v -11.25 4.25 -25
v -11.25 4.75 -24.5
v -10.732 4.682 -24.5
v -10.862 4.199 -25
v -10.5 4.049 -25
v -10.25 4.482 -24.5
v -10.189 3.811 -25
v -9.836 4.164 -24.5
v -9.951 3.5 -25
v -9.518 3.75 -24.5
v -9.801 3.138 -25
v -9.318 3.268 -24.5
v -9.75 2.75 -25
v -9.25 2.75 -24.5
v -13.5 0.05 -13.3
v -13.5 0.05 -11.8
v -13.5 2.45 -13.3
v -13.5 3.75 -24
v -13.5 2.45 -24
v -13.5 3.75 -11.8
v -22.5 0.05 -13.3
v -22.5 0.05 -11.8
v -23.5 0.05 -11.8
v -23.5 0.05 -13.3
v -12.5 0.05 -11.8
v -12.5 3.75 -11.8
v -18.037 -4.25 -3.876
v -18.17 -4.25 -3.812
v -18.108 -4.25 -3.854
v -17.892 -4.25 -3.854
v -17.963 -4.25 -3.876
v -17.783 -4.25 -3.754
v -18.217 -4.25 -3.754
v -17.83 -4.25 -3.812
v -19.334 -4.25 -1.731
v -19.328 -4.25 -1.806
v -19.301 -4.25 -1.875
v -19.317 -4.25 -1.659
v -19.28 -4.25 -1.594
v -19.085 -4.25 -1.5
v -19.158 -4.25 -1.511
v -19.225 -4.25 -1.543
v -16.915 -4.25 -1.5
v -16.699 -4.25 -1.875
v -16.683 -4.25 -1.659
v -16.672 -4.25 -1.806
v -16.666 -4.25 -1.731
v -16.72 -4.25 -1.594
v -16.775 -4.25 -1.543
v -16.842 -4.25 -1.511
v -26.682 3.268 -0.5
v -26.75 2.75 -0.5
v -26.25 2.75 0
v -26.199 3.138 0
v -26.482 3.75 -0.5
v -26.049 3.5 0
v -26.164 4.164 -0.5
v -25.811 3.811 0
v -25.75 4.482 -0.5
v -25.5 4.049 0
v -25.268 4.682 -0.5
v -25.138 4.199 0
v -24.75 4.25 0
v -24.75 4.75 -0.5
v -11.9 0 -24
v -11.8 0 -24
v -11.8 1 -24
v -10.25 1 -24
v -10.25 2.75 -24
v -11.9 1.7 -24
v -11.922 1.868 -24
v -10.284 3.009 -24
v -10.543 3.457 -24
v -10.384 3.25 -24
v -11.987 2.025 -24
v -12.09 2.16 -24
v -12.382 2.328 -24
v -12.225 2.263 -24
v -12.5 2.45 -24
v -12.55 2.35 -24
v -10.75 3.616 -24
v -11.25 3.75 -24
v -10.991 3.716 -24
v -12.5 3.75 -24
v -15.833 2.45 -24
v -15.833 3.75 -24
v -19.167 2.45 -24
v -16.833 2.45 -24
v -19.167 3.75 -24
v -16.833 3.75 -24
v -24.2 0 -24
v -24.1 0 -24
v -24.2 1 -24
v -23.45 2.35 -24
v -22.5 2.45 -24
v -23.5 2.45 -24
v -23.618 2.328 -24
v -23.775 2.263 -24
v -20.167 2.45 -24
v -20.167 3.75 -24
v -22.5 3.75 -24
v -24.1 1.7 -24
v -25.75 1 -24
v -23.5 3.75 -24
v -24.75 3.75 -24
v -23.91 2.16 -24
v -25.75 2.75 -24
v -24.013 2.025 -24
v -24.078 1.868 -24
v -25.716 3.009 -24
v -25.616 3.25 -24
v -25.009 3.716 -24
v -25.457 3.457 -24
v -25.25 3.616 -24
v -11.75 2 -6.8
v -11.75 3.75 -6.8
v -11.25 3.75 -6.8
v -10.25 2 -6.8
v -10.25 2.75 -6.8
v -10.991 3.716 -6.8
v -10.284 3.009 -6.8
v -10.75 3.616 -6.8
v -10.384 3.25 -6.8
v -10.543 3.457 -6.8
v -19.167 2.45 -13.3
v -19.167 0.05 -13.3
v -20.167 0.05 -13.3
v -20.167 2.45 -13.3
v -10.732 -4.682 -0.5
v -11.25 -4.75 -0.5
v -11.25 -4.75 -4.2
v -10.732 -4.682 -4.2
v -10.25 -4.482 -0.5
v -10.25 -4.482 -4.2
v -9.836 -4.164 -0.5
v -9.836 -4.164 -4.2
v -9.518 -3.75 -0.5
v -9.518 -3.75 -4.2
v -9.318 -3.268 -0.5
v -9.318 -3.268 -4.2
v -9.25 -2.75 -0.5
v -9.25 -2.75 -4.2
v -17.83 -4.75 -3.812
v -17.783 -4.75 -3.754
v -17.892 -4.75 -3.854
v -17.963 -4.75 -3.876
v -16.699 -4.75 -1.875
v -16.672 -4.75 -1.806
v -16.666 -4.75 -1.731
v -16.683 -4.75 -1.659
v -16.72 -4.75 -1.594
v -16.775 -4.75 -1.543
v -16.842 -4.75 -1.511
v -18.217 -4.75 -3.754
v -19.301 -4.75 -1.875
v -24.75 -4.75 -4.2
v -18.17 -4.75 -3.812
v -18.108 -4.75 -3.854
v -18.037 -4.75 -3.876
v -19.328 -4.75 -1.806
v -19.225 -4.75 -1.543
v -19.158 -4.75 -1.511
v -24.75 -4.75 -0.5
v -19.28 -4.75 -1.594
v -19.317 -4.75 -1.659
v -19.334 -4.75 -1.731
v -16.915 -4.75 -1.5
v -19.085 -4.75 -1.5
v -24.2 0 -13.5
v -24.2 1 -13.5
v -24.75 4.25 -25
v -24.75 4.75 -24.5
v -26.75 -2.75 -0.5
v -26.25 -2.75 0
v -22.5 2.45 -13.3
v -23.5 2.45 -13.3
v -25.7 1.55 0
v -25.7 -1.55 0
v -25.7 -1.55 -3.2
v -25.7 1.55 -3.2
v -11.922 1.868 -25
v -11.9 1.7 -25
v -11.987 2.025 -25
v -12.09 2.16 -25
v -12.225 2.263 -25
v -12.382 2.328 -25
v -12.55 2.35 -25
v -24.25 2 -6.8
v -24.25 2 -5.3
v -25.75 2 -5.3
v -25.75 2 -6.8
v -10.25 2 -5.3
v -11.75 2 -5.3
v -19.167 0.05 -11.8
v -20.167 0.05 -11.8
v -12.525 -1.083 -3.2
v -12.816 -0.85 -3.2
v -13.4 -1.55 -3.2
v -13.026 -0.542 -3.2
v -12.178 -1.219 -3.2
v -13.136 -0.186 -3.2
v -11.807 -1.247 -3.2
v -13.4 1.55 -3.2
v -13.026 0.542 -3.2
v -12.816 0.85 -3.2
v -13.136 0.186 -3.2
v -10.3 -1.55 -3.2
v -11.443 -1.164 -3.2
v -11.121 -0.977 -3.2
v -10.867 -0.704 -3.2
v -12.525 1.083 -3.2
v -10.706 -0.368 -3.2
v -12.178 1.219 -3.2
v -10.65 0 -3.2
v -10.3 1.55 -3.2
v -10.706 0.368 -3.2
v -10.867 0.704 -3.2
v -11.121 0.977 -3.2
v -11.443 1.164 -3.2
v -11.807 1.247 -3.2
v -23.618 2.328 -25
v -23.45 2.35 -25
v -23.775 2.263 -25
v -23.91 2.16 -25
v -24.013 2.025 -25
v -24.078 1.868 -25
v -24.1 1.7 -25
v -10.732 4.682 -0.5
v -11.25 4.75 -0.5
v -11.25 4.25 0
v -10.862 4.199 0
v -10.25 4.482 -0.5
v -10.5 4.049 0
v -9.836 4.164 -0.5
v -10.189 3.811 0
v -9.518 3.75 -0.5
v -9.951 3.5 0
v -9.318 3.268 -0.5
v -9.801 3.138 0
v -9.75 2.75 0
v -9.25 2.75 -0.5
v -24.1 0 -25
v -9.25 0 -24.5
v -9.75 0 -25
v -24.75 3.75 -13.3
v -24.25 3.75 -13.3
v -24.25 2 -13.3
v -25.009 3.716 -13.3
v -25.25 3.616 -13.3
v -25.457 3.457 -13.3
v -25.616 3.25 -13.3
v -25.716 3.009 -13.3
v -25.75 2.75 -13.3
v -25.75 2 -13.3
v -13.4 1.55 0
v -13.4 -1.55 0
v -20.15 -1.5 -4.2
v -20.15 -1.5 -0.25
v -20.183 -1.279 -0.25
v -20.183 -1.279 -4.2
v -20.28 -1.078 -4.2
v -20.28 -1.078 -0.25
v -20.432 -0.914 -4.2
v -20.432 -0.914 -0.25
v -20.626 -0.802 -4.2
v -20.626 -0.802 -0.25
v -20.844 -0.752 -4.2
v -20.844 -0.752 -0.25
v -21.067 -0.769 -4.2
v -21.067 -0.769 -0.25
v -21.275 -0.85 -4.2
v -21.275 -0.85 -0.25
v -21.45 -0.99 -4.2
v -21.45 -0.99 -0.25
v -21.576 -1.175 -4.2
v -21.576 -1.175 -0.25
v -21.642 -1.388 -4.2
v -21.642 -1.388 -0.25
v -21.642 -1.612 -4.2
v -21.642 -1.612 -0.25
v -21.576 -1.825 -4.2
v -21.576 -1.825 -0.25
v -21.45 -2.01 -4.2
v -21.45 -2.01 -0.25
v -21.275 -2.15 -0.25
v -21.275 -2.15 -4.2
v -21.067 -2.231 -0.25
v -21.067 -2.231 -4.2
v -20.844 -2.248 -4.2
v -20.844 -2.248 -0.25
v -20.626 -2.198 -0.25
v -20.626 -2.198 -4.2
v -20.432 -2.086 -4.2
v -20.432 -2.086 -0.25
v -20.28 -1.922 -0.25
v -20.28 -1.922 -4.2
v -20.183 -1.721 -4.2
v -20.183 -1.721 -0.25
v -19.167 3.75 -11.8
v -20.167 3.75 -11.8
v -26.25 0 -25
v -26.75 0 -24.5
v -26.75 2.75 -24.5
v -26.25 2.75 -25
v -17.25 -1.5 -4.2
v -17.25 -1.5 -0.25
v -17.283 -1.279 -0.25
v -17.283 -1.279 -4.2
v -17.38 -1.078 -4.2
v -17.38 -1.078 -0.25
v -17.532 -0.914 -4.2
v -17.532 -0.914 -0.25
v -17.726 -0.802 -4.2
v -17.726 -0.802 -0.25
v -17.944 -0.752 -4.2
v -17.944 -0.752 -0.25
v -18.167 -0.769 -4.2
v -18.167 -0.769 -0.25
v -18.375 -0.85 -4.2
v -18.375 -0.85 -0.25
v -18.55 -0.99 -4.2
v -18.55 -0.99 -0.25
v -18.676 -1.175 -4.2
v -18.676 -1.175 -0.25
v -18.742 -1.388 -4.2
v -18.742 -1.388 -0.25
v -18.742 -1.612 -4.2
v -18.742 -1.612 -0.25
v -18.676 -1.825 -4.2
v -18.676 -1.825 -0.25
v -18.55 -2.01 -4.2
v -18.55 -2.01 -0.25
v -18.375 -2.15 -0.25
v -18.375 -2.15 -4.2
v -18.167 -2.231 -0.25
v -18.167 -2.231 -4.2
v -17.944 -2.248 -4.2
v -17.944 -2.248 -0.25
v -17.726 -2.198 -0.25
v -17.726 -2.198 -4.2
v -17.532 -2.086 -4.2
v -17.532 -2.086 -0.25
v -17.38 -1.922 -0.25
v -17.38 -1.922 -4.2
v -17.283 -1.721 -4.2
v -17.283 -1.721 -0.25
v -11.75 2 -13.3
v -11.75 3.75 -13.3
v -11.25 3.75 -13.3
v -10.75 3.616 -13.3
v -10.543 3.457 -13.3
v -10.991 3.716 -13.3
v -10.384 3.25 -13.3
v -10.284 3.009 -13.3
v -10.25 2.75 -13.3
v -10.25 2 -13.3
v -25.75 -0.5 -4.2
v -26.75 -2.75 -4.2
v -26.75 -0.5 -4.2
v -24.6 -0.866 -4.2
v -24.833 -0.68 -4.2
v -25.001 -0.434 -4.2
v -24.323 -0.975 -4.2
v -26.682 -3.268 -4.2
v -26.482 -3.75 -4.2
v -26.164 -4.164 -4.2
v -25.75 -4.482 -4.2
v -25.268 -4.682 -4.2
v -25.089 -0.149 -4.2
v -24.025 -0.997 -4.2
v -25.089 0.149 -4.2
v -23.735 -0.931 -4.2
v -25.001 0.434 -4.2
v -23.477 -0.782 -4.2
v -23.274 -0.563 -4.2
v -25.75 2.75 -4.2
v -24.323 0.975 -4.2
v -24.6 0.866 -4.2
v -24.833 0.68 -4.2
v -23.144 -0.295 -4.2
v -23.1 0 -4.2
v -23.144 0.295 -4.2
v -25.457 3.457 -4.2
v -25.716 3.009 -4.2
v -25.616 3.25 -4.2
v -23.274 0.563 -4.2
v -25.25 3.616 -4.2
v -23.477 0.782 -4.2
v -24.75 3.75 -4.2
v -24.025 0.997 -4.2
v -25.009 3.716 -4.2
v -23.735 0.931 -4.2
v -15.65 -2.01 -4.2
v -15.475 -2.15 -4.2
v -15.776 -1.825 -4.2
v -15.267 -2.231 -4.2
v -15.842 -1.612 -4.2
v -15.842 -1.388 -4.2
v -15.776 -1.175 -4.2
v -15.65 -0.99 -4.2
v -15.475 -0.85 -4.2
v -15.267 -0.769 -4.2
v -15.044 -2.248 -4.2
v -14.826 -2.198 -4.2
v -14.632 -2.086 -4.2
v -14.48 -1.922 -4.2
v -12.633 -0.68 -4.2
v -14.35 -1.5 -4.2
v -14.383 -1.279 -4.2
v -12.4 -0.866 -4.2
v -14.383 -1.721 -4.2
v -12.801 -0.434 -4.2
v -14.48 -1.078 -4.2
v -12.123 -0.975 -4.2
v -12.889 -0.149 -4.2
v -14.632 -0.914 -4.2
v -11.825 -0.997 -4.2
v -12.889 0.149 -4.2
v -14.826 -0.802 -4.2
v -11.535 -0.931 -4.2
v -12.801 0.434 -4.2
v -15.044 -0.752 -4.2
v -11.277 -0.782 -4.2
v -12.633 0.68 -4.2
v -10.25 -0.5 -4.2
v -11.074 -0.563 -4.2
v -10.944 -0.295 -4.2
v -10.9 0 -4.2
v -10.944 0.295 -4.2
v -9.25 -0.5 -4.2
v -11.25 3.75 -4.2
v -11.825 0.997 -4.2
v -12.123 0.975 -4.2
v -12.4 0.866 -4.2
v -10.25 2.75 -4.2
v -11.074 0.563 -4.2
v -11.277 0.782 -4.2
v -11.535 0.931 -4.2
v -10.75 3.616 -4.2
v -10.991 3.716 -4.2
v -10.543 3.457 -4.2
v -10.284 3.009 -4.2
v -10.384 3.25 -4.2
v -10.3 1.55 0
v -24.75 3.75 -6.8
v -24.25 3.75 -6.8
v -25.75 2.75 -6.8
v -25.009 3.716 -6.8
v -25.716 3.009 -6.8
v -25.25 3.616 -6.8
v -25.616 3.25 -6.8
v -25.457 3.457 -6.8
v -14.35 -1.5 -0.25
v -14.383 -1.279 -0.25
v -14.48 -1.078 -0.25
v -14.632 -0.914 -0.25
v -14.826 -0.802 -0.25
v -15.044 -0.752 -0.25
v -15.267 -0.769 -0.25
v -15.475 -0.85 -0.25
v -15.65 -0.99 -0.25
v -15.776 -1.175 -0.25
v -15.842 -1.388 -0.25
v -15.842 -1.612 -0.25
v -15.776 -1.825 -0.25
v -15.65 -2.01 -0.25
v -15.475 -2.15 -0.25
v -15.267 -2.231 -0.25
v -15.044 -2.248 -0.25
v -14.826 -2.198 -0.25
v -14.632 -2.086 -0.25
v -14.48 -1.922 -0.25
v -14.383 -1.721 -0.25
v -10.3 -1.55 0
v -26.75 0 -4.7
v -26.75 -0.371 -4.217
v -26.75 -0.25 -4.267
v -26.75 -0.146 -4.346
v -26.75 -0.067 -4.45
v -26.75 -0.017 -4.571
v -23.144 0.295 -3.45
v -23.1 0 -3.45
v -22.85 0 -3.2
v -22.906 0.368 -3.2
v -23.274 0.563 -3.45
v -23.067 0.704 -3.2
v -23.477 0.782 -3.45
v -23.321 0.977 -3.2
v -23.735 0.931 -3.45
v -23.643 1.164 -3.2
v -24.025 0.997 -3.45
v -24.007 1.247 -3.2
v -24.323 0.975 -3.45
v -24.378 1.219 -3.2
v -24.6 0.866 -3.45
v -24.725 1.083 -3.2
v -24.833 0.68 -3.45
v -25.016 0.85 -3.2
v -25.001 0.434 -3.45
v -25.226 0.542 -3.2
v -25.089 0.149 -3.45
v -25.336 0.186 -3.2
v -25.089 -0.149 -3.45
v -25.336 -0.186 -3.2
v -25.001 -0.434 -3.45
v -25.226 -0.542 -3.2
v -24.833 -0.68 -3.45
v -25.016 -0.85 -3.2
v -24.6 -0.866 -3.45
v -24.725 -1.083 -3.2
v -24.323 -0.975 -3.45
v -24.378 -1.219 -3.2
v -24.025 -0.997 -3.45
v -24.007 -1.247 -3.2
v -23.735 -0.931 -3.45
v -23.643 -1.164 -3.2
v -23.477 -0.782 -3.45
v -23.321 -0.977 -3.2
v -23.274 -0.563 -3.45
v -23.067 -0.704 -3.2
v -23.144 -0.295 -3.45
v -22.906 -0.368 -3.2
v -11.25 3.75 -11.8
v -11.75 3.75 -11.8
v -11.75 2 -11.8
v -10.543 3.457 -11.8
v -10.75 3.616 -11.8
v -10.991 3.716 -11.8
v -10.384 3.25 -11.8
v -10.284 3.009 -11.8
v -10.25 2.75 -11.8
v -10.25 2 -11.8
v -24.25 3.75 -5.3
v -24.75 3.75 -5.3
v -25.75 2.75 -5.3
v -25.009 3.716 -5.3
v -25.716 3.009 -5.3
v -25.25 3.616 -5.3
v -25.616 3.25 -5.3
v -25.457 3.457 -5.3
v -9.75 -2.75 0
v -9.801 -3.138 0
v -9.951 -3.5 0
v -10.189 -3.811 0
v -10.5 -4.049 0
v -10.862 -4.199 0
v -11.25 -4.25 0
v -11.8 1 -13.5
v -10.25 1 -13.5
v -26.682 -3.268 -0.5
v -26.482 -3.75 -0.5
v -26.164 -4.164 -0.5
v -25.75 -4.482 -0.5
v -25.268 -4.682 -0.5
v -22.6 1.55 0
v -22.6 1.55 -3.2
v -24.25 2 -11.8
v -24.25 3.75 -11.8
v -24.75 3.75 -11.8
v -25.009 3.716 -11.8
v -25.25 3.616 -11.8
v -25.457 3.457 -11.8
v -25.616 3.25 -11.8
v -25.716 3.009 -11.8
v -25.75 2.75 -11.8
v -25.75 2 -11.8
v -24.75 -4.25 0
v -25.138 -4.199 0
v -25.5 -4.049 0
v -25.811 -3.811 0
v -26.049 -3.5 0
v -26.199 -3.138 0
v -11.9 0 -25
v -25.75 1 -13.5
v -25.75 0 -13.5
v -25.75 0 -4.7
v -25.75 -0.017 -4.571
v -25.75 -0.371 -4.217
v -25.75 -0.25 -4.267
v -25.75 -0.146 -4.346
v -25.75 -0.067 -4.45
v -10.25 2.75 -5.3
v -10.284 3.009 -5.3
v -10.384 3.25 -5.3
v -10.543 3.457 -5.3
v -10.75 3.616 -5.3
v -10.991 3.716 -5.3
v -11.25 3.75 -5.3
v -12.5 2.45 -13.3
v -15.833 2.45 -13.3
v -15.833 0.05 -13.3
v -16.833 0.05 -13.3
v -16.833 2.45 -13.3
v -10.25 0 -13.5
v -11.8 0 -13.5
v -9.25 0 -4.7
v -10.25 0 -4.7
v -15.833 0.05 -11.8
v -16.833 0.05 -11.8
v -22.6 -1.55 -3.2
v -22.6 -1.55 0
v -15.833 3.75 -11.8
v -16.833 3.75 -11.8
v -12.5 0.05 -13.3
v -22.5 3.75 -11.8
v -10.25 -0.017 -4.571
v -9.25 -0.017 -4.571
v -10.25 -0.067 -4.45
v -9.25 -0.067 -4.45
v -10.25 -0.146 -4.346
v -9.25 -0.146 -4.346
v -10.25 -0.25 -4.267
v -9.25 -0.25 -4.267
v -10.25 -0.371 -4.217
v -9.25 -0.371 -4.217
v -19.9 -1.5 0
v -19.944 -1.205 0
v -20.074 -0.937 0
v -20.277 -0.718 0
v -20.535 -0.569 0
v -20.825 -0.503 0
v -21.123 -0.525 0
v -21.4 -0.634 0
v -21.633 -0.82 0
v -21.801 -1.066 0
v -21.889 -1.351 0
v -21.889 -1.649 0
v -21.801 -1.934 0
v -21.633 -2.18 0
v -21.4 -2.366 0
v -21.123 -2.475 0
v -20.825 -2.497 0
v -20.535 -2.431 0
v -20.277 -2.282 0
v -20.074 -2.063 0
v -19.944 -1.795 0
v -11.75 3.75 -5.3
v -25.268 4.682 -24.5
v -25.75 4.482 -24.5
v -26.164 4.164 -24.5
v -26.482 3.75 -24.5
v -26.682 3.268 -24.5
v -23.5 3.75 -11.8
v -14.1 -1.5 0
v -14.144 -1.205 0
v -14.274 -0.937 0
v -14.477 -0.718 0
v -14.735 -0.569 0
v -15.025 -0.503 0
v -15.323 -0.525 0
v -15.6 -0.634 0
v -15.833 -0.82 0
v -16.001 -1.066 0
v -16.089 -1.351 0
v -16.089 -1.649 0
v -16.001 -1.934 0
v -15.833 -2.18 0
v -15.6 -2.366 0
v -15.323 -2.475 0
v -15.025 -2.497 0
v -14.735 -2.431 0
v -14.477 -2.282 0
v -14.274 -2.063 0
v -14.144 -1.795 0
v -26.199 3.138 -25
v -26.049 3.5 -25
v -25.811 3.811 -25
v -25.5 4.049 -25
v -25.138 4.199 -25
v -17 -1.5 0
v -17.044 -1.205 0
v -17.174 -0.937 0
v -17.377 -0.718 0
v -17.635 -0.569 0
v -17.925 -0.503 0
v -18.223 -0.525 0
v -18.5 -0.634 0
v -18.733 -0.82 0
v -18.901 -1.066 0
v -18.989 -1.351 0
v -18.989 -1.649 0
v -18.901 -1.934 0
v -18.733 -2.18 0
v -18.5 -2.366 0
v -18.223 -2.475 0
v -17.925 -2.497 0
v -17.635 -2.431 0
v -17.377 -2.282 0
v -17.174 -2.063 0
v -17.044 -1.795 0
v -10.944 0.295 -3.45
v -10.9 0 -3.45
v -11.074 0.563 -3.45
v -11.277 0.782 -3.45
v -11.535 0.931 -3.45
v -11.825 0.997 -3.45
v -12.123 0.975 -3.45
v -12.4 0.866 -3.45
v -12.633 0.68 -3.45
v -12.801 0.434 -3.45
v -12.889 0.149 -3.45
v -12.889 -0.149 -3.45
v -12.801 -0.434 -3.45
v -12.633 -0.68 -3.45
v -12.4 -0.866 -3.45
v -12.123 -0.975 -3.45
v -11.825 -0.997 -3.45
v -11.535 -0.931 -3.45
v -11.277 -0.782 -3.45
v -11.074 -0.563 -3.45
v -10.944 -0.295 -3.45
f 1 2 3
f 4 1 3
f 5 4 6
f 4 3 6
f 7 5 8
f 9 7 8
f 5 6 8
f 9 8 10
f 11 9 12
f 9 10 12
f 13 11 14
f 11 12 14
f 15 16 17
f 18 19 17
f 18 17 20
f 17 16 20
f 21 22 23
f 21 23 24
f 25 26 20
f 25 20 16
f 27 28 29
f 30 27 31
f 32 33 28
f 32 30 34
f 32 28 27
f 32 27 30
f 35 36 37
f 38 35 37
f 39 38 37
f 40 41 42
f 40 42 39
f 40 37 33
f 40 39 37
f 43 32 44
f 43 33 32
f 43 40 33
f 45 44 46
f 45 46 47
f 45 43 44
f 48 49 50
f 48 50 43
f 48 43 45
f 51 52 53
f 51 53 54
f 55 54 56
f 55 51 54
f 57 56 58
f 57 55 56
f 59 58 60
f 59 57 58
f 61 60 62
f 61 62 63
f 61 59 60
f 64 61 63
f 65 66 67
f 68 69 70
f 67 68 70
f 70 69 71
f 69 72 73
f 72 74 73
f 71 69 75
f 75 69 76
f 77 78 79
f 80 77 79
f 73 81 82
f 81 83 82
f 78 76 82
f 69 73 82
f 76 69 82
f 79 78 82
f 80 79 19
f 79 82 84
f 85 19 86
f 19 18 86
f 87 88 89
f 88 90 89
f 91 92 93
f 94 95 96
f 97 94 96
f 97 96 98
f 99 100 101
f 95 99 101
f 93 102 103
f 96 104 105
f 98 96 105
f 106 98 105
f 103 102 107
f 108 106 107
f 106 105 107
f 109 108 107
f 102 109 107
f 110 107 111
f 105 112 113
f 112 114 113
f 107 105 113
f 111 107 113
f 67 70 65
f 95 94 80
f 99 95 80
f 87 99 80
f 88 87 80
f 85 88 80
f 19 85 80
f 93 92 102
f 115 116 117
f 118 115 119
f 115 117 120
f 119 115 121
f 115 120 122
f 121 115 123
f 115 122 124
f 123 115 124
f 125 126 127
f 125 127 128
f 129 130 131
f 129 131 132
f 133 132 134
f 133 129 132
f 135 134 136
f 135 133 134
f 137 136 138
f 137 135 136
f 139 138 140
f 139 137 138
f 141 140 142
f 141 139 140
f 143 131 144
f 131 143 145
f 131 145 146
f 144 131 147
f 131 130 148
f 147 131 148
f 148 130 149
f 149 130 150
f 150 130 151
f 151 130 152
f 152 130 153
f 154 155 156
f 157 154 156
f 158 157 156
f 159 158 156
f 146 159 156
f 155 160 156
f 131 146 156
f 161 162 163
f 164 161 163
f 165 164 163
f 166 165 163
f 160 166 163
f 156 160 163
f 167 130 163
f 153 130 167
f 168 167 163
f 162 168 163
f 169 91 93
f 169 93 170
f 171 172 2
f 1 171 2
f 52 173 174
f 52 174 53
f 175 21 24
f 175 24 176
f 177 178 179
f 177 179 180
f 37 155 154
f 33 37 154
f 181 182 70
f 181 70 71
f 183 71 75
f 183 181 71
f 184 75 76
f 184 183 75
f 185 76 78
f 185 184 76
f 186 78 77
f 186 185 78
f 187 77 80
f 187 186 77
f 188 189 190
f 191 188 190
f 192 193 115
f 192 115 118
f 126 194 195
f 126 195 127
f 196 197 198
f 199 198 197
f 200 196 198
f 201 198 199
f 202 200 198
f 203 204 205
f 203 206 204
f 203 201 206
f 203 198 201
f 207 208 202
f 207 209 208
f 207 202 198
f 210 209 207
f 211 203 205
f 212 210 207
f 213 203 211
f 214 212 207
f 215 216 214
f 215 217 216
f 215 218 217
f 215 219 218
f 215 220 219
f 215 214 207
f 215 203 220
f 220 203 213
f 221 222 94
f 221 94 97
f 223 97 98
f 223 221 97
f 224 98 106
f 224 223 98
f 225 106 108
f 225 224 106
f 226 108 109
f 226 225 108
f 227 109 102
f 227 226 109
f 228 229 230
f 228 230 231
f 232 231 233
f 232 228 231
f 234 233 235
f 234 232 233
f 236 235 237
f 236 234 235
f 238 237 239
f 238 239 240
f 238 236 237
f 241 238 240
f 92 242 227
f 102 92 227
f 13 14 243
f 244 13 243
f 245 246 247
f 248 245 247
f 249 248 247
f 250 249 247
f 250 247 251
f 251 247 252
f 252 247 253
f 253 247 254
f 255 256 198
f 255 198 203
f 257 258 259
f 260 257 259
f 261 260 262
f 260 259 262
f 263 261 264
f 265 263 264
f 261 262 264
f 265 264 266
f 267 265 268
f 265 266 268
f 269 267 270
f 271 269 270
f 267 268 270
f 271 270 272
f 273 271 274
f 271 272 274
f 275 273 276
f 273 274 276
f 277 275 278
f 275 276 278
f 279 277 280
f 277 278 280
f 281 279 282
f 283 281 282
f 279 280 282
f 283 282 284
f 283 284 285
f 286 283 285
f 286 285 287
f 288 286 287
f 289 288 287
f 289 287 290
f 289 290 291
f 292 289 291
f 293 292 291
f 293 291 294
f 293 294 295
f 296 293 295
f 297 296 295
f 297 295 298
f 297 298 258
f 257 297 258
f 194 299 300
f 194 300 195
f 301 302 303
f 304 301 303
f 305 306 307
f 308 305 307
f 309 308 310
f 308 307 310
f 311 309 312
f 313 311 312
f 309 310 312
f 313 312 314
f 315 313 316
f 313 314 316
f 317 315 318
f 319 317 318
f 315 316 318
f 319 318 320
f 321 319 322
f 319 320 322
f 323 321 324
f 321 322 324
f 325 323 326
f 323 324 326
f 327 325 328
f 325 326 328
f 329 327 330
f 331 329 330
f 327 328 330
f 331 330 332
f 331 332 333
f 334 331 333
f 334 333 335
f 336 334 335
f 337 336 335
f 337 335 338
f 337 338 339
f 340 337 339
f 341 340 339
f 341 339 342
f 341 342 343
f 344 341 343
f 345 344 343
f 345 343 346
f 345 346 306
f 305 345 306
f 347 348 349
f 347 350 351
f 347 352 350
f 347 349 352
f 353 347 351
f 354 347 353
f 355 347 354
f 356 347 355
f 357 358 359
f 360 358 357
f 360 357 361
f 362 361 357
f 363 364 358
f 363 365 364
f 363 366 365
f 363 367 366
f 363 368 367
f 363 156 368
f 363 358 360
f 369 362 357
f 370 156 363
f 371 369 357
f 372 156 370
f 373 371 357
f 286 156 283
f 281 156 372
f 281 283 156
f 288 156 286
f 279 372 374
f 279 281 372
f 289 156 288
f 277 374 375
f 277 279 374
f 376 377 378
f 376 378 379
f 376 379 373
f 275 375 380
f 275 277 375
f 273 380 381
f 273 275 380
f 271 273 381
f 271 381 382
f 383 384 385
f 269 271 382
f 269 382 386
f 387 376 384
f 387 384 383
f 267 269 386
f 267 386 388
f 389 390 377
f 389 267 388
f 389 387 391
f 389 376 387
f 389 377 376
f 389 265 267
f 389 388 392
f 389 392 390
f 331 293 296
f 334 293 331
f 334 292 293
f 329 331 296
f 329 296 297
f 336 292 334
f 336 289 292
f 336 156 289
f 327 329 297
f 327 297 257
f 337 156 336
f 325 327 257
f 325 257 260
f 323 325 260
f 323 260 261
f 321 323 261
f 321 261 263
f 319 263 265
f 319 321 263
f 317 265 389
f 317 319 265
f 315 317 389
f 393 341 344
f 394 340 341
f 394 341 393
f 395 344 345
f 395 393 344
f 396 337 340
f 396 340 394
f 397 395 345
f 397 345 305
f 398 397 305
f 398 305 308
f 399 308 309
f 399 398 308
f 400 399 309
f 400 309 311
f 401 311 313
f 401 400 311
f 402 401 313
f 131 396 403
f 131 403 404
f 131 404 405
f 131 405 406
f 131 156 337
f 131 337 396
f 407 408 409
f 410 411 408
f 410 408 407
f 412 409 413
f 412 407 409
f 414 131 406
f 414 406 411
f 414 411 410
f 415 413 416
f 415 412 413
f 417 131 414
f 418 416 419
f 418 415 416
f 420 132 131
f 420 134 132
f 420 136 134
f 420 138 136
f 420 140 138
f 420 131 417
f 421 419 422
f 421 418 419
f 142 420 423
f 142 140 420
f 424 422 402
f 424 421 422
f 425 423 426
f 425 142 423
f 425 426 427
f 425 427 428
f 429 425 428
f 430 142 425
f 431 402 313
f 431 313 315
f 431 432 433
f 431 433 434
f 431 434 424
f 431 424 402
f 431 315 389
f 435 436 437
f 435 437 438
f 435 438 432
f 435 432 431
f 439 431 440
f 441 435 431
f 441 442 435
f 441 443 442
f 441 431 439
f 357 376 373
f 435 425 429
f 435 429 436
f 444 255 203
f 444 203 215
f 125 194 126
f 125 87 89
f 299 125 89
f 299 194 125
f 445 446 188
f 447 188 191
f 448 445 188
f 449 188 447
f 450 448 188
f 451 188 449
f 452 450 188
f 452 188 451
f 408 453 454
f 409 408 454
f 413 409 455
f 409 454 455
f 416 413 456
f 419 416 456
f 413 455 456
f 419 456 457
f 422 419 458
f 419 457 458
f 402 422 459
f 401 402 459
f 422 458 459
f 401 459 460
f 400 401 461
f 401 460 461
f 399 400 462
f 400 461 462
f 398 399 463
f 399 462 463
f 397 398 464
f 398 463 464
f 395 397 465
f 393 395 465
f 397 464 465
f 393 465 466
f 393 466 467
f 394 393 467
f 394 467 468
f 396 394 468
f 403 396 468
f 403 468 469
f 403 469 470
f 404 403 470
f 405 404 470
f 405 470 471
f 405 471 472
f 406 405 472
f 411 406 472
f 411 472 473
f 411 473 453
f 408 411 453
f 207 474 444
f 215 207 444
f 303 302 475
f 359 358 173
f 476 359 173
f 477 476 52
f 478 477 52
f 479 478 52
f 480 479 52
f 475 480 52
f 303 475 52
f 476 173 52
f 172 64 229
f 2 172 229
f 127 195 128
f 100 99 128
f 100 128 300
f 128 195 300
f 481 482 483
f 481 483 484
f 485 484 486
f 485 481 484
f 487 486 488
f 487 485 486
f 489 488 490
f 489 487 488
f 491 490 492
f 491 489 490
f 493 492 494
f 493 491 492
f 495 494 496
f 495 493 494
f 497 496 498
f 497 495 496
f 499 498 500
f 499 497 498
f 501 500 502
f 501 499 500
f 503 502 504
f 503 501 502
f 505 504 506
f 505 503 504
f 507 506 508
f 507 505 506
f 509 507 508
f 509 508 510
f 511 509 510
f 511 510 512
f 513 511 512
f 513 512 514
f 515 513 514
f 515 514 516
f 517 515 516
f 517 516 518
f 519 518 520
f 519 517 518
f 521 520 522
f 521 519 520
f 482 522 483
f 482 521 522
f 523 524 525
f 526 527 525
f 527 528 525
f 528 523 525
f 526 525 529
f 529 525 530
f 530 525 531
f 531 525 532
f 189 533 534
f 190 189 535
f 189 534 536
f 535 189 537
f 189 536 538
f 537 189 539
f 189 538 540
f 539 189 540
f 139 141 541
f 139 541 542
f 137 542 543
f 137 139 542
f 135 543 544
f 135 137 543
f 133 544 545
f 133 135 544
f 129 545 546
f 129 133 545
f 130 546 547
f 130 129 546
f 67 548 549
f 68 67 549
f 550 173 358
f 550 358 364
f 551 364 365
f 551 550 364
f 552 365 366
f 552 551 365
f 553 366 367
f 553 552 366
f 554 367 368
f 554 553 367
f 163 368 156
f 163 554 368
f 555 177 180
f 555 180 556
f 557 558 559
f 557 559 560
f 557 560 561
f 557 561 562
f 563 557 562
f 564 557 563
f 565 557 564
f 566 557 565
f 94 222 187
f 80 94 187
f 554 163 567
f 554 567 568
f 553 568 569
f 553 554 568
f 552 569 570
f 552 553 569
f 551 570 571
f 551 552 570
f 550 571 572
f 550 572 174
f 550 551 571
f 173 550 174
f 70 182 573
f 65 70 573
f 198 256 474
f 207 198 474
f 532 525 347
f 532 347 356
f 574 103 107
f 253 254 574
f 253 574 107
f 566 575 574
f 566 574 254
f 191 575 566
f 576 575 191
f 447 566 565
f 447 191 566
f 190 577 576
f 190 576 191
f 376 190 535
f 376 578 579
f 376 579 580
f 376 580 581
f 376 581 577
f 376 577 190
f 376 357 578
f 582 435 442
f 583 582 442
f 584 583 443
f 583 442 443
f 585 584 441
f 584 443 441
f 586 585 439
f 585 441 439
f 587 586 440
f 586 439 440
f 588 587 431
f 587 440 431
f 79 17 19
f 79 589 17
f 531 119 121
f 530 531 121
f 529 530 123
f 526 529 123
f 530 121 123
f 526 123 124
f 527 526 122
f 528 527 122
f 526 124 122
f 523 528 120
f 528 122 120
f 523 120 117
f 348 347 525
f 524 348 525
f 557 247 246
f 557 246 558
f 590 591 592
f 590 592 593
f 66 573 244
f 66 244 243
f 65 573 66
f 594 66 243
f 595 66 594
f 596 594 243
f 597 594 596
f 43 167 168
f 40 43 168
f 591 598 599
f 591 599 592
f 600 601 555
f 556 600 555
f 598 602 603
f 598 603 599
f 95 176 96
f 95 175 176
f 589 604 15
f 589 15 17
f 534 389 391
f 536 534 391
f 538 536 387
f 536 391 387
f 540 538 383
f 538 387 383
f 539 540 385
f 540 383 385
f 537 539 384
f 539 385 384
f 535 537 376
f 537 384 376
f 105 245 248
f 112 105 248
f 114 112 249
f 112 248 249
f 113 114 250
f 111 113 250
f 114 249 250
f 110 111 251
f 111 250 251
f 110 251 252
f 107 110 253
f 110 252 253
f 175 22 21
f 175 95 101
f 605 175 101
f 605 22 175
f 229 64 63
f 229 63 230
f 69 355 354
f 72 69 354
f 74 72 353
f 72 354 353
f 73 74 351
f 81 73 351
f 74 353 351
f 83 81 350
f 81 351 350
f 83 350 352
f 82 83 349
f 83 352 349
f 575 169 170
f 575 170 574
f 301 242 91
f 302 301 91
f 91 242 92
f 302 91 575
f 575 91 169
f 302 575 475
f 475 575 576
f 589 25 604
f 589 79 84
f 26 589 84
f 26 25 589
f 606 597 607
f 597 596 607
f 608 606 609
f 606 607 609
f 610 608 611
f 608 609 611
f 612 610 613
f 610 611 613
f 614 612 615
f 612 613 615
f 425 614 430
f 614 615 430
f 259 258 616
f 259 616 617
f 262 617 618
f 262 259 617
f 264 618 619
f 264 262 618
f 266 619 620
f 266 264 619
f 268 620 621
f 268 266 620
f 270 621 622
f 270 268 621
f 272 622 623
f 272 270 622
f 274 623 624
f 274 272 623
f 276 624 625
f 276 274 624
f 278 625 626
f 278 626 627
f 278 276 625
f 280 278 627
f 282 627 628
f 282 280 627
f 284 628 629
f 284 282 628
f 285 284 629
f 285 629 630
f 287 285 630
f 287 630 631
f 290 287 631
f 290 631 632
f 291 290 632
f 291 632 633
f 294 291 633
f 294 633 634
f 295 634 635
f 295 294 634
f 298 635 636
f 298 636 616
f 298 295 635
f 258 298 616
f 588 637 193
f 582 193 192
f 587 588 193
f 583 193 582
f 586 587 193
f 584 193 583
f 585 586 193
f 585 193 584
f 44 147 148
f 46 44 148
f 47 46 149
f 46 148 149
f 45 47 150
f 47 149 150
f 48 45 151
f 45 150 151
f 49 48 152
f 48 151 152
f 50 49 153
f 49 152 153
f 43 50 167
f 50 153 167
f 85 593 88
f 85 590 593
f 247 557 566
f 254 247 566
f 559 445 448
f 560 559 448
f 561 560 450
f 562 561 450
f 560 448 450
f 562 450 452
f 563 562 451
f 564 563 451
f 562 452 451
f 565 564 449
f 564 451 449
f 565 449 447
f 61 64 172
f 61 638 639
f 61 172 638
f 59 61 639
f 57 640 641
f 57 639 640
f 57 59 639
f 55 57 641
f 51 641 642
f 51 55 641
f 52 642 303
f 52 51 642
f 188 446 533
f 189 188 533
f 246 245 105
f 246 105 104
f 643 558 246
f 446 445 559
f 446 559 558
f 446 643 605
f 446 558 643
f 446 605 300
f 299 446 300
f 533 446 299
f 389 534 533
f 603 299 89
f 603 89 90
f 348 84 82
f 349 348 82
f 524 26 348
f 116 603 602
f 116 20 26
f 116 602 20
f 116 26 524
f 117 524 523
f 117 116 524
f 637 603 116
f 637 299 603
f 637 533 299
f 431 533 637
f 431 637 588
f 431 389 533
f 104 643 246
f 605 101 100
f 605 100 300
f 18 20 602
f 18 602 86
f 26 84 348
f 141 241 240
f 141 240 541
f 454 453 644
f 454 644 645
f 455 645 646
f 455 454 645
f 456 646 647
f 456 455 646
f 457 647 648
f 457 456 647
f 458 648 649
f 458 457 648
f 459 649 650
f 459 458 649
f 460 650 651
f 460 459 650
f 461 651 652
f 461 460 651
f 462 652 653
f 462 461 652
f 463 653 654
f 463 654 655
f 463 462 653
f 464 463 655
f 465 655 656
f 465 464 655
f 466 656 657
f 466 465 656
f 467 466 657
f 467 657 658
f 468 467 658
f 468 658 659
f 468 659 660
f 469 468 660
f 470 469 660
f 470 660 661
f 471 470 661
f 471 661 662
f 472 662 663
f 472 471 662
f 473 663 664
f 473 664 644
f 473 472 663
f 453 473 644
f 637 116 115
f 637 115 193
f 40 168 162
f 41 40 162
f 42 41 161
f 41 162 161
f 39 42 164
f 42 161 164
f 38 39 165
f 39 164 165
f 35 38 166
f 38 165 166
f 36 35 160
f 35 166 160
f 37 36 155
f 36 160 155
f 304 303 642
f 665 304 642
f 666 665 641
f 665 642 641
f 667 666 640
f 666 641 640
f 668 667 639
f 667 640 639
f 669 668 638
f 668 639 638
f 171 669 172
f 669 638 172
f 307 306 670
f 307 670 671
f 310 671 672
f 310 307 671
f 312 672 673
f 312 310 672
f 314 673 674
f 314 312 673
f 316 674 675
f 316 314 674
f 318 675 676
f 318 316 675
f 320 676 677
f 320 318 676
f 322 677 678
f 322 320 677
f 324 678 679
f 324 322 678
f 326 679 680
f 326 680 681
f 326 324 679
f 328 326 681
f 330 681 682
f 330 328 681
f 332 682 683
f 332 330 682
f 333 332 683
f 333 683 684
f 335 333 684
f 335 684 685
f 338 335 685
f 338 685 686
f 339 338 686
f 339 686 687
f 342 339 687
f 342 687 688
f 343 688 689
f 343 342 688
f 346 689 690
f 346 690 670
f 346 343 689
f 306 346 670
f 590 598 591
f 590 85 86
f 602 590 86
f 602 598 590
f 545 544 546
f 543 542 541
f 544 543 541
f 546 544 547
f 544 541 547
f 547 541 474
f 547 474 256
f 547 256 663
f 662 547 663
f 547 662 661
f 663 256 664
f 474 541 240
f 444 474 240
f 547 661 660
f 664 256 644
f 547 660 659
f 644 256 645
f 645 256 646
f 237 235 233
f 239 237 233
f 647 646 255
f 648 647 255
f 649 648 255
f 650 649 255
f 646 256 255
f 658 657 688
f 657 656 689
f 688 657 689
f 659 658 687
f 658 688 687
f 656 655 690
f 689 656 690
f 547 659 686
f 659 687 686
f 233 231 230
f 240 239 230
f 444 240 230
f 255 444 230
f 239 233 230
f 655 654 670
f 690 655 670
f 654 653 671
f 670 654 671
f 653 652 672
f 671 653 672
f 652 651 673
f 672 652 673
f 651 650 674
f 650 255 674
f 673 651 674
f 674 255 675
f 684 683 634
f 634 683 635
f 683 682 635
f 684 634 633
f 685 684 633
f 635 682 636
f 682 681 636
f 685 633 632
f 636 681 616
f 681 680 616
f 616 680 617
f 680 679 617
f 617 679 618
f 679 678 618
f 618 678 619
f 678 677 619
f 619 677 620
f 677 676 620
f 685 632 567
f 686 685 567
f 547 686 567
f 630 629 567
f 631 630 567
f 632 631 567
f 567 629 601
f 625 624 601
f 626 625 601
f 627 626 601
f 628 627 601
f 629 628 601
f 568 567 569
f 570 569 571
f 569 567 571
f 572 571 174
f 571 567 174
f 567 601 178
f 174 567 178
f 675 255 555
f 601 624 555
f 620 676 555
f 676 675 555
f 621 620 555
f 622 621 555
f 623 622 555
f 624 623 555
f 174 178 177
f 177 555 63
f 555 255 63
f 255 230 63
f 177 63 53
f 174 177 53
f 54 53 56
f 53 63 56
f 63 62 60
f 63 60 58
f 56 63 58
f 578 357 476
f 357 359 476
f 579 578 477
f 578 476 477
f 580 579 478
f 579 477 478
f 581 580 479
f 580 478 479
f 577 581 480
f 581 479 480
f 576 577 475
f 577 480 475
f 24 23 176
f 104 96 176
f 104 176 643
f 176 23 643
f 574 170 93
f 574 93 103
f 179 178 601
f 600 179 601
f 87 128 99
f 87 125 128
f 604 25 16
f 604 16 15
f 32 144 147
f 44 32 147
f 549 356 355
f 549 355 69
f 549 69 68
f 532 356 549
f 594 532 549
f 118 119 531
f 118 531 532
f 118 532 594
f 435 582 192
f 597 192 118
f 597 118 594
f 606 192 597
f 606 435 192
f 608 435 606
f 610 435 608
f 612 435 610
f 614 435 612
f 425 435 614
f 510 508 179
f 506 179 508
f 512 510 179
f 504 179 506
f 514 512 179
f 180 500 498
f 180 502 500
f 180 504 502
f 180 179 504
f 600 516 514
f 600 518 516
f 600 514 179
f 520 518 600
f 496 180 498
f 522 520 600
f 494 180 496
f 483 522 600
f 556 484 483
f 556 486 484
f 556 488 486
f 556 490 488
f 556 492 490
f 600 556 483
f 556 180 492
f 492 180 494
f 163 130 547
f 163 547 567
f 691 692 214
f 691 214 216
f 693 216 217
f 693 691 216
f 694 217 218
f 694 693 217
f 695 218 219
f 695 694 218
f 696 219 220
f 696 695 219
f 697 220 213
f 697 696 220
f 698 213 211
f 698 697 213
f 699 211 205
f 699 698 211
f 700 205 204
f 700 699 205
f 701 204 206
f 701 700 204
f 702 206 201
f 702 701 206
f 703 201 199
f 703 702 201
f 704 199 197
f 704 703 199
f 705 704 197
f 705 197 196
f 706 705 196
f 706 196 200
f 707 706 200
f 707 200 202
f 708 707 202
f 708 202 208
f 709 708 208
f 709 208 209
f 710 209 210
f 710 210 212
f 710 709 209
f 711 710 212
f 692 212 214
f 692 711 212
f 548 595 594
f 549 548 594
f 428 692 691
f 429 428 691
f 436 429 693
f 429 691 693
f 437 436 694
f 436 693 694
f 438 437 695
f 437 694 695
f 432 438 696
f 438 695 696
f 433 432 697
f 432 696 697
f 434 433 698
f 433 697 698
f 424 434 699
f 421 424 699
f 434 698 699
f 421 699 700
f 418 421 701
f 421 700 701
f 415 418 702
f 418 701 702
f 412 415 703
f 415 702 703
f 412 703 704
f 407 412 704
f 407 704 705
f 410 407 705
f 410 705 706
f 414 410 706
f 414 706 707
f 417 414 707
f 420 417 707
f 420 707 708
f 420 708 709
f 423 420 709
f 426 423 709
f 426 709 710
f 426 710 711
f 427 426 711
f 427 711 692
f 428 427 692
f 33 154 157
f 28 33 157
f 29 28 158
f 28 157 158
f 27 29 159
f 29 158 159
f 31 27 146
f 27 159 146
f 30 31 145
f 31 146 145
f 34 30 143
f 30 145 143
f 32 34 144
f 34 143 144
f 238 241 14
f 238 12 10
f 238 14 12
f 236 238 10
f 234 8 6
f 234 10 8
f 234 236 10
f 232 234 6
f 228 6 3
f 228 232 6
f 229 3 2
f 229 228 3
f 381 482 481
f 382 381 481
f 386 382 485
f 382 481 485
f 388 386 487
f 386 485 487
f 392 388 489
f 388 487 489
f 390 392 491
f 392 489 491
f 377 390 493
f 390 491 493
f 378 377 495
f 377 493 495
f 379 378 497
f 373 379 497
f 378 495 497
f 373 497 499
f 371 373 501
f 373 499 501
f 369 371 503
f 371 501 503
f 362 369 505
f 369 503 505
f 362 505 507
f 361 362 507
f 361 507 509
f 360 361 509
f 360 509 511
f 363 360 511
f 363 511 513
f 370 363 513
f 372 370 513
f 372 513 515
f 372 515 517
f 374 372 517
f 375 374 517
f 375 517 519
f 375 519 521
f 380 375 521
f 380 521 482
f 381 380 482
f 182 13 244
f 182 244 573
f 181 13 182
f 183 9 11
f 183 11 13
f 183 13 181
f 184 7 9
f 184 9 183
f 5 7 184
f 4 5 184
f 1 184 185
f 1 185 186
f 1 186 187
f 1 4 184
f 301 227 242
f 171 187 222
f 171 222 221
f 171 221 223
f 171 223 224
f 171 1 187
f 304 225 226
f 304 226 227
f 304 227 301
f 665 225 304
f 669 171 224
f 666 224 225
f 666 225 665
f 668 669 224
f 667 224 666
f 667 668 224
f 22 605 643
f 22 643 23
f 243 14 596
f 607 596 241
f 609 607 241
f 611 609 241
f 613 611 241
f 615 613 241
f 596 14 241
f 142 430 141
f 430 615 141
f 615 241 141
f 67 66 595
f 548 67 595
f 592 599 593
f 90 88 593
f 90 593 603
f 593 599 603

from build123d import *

# Parameters (mm, degrees)
PAD005_DEPTH           = 25
SKETCH014_W            = 3.1
SKETCH014_H            = 3.1
POCKET008_DEPTH        = 3.2
POCKET010_DEPTH        = 20.801
POCKET011_DEPTH        = 0.5
CHAMFER002_SIZE        = 0.5
SKETCH019_R            = 0.75
SKETCH019_R_2          = 1
POCKET012_DEPTH        = 25.001
CHAMFER003_SIZE        = 0.25
PAD009_DEPTH           = 1
CHAMFER_SIZE           = 0.5
PAD021_DEPTH           = 0.5
LINEARPATTERN001_COUNT = 4
LINEARPATTERN001_PITCH = 3.3333333333
SKETCH047_W            = 1.55
SKETCH047_H            = 10.5
PAD022_DEPTH           = 1
SKETCH048_W            = 1.5
SKETCH048_H            = 1.5
PAD023_DEPTH           = 4
SKETCH054_W            = 7.578003
SKETCH054_H            = 26.545825
POCKET038_DEPTH        = 8.751
POCKET038_DEPTH_BACK   = 8.751
FILLET005_R            = 0.5
SKETCH055_W            = 1.5
SKETCH055_H            = 1.5
POCKET039_DEPTH        = 2


with BuildPart() as part:
    # Sketch013 → Pad005 (new body)
    with BuildSketch(Plane.XY):
        with BuildLine():
            Line((-6.75, 4.75), (6.75, 4.75))
            ThreePointArc((8.75, 2.75), (8.1642135624, 4.1642135624), (6.75, 4.75))
            Line((8.75, 2.75), (8.75, -2.75))
            ThreePointArc((6.75, -4.75), (8.1642135624, -4.1642135624), (8.75, -2.75))
            Line((6.75, -4.75), (-6.75, -4.75))
            ThreePointArc((-8.75, -2.75), (-8.1642135624, -4.1642135624), (-6.75, -4.75))
            Line((-8.75, -2.75), (-8.75, 2.75))
            ThreePointArc((-6.75, 4.75), (-8.1642135624, 4.1642135624), (-8.75, 2.75))
        make_face()
    extrude(amount=-PAD005_DEPTH)

    # Sketch014 (on Face9 of Pad005) → Pocket008 (cut)
    with BuildSketch(Plane.XY):
        with Locations((6.15, 0)):
            Rectangle(SKETCH014_W, SKETCH014_H)
        with Locations((-6.15, 0)):
            Rectangle(SKETCH014_W, SKETCH014_H)
    extrude(amount=-POCKET008_DEPTH, mode=Mode.SUBTRACT)

    # Sketch017 → Pocket010 (cut, through all)
    with BuildSketch(Plane.XY.offset(-4.2)):
        with BuildLine():
            Line((-6.75, 3.75), (6.75, 3.75))
            ThreePointArc((7.75, 2.75), (7.4571067812, 3.4571067812), (6.75, 3.75))
            Line((7.75, 2.75), (7.75, -2.75))
            ThreePointArc((6.75, -3.75), (7.4571067812, -3.4571067812), (7.75, -2.75))
            Line((6.75, -3.75), (-6.75, -3.75))
            ThreePointArc((-7.75, -2.75), (-7.4571067812, -3.4571067812), (-6.75, -3.75))
            Line((-7.75, -2.75), (-7.75, 2.75))
            ThreePointArc((-6.75, 3.75), (-7.4571067812, 3.4571067812), (-7.75, 2.75))
        make_face()
    extrude(amount=-POCKET010_DEPTH, mode=Mode.SUBTRACT)

    # Sketch018 → Pocket011 (cut)
    with BuildSketch(Plane.XZ.offset(4.75)):
        with BuildLine():
            Line((1.0846232888, -1.5), (-1.0846232888, -1.5))
            ThreePointArc((-1.0846232888, -1.5), (-1.3011296398, -1.625), (-1.3011296398, -1.875))
            Line((-1.3011296398, -1.875), (-0.2165063509, -3.7536226433))
            ThreePointArc((-0.2165063509, -3.7536226433), (0, -3.8786226433), (0.2165063509, -3.7536226433))
            Line((0.2165063509, -3.7536226433), (1.3011296398, -1.875))
            ThreePointArc((1.3011296398, -1.875), (1.3011296398, -1.625), (1.0846232888, -1.5))
        make_face()
    extrude(amount=-POCKET011_DEPTH, mode=Mode.SUBTRACT)

    # Chamfer002
    chamfer002_edges = [part.edges().sort_by_distance(p)[0] for p in [
        (8.75, 0, 0),
    ]]
    chamfer(chamfer002_edges, length=CHAMFER002_SIZE)

    # Sketch019 (on Face8 of Chamfer002) → Pocket012 (cut, through all)
    with BuildSketch(Plane.XY):
        with Locations((0, -1.5)):
            Circle(SKETCH019_R)
        with Locations((2.9, -1.5)):
            Circle(SKETCH019_R)
        with Locations((-2.9, -1.5)):
            Circle(SKETCH019_R)
        with Locations((-6.1, 0)):
            Circle(SKETCH019_R_2)
        with Locations((6.1, 0)):
            Circle(SKETCH019_R_2)
    extrude(amount=-POCKET012_DEPTH, mode=Mode.SUBTRACT)

    # Chamfer003
    chamfer003_edges = [part.edges().sort_by_distance(p)[0] for p in [
        (-7.1, 0, -3.2),
        (5.1, 0, -3.2),
        (2.15, -1.5, 0),
        (-0.75, -1.5, 0),
        (-3.65, -1.5, 0),
    ]]
    chamfer(chamfer003_edges, length=CHAMFER003_SIZE)

    # Sketch027 → Pad009 (join)
    with BuildSketch(Plane.XY.offset(-25)):
        with BuildLine():
            Line((-6.75, 4.75), (6.75, 4.75))
            ThreePointArc((8.75, 2.75), (8.1642135624, 4.1642135624), (6.75, 4.75))
            Line((8.75, 2.75), (8.75, -2.75))
            ThreePointArc((6.75, -4.75), (8.1642135624, -4.1642135624), (8.75, -2.75))
            Line((6.75, -4.75), (-6.75, -4.75))
            ThreePointArc((-8.75, -2.75), (-8.1642135624, -4.1642135624), (-6.75, -4.75))
            Line((-8.75, -2.75), (-8.75, 2.75))
            ThreePointArc((-6.75, 4.75), (-8.1642135624, 4.1642135624), (-8.75, 2.75))
        make_face()
        with BuildLine():
            ThreePointArc((-5.45, 2.35), (-5.9096194078, 2.1596194078), (-6.1, 1.7))
            Line((-6.1, -1.7), (-6.1, 1.7))
            ThreePointArc((-6.1, -1.7), (-5.9096194078, -2.1596194078), (-5.45, -2.35))
            Line((5.45, -2.35), (-5.45, -2.35))
            ThreePointArc((5.45, -2.35), (5.9096194078, -2.1596194078), (6.1, -1.7))
            Line((6.1, 1.7), (6.1, -1.7))
            ThreePointArc((6.1, 1.7), (5.9096194078, 2.1596194078), (5.45, 2.35))
            Line((-5.45, 2.35), (5.45, 2.35))
        make_face(mode=Mode.SUBTRACT)
    extrude(amount=PAD009_DEPTH)

    # Chamfer
    chamfer_edges = [part.edges().sort_by_distance(p)[0] for p in [
        (0, -4.75, -25),
    ]]
    chamfer(chamfer_edges, length=CHAMFER_SIZE)

    # Sketch046 → Pad021 (join, symmetric)
    with BuildSketch(Plane.YZ.offset(5)):
        Polygon((3.75, -24), (3.75, -11.8), (0.05, -11.8), (0.05, -13.3), (2.45, -13.3), (2.45, -24), align=None)
    pad021 = extrude(amount=PAD021_DEPTH, both=True)

    # LinearPattern001: Pad021 ×4
    with Locations(*[(-i * LINEARPATTERN001_PITCH, 0, 0) for i in range(1, LINEARPATTERN001_COUNT)]):
        add(pad021)

    # Sketch047 → Pad022 (join, symmetric)
    with BuildSketch(Plane.XZ):
        with Locations((6.975, -18.75)):
            Rectangle(SKETCH047_W, SKETCH047_H)
    pad022 = extrude(amount=PAD022_DEPTH, both=True)

    # Mirrored008: Pad022 across Sketch047 V_Axis
    add(pad022.mirror(Plane(origin=(0, 0, 0), x_dir=(0, -1, 0), z_dir=(1, 0, 0))))

    # Sketch048 → Pad023 (join, symmetric)
    with BuildSketch(Plane.XZ):
        with Locations((7, -6.05)):
            Rectangle(SKETCH048_W, SKETCH048_H)
        with Locations((7, -12.55)):
            Rectangle(SKETCH048_W, SKETCH048_H)
    pad023 = extrude(amount=PAD023_DEPTH, both=True)

    # Mirrored009: Pad023 across Sketch048 V_Axis
    add(pad023.mirror(Plane(origin=(0, 0, 0), x_dir=(0, -1, 0), z_dir=(1, 0, 0))))

    # Sketch054 → Pocket038 (cut, two sides)
    with BuildSketch(Plane.YZ) as pocket038_sk:
        with Locations((-3.7890015, -17.4729125)):
            Rectangle(SKETCH054_W, SKETCH054_H)
    extrude(amount=-POCKET038_DEPTH, mode=Mode.SUBTRACT)
    extrude(pocket038_sk.sketch, amount=POCKET038_DEPTH_BACK, mode=Mode.SUBTRACT)

    # Fillet005
    fillet005_edges = [part.edges().sort_by_distance(p)[0] for p in [
        (-8.25, 0, -4.2),
        (8.25, 0, -4.2),
    ]]
    fillet(fillet005_edges, radius=FILLET005_R)

    # Sketch055 → Pocket039 (cut)
    with BuildSketch(Plane.XZ):
        with Locations((7, -6.05)):
            Rectangle(SKETCH055_W, SKETCH055_H)
        with Locations((7, -12.55)):
            Rectangle(SKETCH055_W, SKETCH055_H)
    pocket039 = extrude(amount=-POCKET039_DEPTH, mode=Mode.SUBTRACT)

    # Mirrored010: Pocket039 across Sketch055 V_Axis
    add(pocket039.mirror(Plane(origin=(0, 0, 0), x_dir=(0, -1, 0), z_dir=(1, 0, 0))), mode=Mode.SUBTRACT)


with BuildPart() as part_1:
    # Body012 placement: moved
    add(part.part.moved(Location((-18, 0, 0))))


solid = part_1.part
